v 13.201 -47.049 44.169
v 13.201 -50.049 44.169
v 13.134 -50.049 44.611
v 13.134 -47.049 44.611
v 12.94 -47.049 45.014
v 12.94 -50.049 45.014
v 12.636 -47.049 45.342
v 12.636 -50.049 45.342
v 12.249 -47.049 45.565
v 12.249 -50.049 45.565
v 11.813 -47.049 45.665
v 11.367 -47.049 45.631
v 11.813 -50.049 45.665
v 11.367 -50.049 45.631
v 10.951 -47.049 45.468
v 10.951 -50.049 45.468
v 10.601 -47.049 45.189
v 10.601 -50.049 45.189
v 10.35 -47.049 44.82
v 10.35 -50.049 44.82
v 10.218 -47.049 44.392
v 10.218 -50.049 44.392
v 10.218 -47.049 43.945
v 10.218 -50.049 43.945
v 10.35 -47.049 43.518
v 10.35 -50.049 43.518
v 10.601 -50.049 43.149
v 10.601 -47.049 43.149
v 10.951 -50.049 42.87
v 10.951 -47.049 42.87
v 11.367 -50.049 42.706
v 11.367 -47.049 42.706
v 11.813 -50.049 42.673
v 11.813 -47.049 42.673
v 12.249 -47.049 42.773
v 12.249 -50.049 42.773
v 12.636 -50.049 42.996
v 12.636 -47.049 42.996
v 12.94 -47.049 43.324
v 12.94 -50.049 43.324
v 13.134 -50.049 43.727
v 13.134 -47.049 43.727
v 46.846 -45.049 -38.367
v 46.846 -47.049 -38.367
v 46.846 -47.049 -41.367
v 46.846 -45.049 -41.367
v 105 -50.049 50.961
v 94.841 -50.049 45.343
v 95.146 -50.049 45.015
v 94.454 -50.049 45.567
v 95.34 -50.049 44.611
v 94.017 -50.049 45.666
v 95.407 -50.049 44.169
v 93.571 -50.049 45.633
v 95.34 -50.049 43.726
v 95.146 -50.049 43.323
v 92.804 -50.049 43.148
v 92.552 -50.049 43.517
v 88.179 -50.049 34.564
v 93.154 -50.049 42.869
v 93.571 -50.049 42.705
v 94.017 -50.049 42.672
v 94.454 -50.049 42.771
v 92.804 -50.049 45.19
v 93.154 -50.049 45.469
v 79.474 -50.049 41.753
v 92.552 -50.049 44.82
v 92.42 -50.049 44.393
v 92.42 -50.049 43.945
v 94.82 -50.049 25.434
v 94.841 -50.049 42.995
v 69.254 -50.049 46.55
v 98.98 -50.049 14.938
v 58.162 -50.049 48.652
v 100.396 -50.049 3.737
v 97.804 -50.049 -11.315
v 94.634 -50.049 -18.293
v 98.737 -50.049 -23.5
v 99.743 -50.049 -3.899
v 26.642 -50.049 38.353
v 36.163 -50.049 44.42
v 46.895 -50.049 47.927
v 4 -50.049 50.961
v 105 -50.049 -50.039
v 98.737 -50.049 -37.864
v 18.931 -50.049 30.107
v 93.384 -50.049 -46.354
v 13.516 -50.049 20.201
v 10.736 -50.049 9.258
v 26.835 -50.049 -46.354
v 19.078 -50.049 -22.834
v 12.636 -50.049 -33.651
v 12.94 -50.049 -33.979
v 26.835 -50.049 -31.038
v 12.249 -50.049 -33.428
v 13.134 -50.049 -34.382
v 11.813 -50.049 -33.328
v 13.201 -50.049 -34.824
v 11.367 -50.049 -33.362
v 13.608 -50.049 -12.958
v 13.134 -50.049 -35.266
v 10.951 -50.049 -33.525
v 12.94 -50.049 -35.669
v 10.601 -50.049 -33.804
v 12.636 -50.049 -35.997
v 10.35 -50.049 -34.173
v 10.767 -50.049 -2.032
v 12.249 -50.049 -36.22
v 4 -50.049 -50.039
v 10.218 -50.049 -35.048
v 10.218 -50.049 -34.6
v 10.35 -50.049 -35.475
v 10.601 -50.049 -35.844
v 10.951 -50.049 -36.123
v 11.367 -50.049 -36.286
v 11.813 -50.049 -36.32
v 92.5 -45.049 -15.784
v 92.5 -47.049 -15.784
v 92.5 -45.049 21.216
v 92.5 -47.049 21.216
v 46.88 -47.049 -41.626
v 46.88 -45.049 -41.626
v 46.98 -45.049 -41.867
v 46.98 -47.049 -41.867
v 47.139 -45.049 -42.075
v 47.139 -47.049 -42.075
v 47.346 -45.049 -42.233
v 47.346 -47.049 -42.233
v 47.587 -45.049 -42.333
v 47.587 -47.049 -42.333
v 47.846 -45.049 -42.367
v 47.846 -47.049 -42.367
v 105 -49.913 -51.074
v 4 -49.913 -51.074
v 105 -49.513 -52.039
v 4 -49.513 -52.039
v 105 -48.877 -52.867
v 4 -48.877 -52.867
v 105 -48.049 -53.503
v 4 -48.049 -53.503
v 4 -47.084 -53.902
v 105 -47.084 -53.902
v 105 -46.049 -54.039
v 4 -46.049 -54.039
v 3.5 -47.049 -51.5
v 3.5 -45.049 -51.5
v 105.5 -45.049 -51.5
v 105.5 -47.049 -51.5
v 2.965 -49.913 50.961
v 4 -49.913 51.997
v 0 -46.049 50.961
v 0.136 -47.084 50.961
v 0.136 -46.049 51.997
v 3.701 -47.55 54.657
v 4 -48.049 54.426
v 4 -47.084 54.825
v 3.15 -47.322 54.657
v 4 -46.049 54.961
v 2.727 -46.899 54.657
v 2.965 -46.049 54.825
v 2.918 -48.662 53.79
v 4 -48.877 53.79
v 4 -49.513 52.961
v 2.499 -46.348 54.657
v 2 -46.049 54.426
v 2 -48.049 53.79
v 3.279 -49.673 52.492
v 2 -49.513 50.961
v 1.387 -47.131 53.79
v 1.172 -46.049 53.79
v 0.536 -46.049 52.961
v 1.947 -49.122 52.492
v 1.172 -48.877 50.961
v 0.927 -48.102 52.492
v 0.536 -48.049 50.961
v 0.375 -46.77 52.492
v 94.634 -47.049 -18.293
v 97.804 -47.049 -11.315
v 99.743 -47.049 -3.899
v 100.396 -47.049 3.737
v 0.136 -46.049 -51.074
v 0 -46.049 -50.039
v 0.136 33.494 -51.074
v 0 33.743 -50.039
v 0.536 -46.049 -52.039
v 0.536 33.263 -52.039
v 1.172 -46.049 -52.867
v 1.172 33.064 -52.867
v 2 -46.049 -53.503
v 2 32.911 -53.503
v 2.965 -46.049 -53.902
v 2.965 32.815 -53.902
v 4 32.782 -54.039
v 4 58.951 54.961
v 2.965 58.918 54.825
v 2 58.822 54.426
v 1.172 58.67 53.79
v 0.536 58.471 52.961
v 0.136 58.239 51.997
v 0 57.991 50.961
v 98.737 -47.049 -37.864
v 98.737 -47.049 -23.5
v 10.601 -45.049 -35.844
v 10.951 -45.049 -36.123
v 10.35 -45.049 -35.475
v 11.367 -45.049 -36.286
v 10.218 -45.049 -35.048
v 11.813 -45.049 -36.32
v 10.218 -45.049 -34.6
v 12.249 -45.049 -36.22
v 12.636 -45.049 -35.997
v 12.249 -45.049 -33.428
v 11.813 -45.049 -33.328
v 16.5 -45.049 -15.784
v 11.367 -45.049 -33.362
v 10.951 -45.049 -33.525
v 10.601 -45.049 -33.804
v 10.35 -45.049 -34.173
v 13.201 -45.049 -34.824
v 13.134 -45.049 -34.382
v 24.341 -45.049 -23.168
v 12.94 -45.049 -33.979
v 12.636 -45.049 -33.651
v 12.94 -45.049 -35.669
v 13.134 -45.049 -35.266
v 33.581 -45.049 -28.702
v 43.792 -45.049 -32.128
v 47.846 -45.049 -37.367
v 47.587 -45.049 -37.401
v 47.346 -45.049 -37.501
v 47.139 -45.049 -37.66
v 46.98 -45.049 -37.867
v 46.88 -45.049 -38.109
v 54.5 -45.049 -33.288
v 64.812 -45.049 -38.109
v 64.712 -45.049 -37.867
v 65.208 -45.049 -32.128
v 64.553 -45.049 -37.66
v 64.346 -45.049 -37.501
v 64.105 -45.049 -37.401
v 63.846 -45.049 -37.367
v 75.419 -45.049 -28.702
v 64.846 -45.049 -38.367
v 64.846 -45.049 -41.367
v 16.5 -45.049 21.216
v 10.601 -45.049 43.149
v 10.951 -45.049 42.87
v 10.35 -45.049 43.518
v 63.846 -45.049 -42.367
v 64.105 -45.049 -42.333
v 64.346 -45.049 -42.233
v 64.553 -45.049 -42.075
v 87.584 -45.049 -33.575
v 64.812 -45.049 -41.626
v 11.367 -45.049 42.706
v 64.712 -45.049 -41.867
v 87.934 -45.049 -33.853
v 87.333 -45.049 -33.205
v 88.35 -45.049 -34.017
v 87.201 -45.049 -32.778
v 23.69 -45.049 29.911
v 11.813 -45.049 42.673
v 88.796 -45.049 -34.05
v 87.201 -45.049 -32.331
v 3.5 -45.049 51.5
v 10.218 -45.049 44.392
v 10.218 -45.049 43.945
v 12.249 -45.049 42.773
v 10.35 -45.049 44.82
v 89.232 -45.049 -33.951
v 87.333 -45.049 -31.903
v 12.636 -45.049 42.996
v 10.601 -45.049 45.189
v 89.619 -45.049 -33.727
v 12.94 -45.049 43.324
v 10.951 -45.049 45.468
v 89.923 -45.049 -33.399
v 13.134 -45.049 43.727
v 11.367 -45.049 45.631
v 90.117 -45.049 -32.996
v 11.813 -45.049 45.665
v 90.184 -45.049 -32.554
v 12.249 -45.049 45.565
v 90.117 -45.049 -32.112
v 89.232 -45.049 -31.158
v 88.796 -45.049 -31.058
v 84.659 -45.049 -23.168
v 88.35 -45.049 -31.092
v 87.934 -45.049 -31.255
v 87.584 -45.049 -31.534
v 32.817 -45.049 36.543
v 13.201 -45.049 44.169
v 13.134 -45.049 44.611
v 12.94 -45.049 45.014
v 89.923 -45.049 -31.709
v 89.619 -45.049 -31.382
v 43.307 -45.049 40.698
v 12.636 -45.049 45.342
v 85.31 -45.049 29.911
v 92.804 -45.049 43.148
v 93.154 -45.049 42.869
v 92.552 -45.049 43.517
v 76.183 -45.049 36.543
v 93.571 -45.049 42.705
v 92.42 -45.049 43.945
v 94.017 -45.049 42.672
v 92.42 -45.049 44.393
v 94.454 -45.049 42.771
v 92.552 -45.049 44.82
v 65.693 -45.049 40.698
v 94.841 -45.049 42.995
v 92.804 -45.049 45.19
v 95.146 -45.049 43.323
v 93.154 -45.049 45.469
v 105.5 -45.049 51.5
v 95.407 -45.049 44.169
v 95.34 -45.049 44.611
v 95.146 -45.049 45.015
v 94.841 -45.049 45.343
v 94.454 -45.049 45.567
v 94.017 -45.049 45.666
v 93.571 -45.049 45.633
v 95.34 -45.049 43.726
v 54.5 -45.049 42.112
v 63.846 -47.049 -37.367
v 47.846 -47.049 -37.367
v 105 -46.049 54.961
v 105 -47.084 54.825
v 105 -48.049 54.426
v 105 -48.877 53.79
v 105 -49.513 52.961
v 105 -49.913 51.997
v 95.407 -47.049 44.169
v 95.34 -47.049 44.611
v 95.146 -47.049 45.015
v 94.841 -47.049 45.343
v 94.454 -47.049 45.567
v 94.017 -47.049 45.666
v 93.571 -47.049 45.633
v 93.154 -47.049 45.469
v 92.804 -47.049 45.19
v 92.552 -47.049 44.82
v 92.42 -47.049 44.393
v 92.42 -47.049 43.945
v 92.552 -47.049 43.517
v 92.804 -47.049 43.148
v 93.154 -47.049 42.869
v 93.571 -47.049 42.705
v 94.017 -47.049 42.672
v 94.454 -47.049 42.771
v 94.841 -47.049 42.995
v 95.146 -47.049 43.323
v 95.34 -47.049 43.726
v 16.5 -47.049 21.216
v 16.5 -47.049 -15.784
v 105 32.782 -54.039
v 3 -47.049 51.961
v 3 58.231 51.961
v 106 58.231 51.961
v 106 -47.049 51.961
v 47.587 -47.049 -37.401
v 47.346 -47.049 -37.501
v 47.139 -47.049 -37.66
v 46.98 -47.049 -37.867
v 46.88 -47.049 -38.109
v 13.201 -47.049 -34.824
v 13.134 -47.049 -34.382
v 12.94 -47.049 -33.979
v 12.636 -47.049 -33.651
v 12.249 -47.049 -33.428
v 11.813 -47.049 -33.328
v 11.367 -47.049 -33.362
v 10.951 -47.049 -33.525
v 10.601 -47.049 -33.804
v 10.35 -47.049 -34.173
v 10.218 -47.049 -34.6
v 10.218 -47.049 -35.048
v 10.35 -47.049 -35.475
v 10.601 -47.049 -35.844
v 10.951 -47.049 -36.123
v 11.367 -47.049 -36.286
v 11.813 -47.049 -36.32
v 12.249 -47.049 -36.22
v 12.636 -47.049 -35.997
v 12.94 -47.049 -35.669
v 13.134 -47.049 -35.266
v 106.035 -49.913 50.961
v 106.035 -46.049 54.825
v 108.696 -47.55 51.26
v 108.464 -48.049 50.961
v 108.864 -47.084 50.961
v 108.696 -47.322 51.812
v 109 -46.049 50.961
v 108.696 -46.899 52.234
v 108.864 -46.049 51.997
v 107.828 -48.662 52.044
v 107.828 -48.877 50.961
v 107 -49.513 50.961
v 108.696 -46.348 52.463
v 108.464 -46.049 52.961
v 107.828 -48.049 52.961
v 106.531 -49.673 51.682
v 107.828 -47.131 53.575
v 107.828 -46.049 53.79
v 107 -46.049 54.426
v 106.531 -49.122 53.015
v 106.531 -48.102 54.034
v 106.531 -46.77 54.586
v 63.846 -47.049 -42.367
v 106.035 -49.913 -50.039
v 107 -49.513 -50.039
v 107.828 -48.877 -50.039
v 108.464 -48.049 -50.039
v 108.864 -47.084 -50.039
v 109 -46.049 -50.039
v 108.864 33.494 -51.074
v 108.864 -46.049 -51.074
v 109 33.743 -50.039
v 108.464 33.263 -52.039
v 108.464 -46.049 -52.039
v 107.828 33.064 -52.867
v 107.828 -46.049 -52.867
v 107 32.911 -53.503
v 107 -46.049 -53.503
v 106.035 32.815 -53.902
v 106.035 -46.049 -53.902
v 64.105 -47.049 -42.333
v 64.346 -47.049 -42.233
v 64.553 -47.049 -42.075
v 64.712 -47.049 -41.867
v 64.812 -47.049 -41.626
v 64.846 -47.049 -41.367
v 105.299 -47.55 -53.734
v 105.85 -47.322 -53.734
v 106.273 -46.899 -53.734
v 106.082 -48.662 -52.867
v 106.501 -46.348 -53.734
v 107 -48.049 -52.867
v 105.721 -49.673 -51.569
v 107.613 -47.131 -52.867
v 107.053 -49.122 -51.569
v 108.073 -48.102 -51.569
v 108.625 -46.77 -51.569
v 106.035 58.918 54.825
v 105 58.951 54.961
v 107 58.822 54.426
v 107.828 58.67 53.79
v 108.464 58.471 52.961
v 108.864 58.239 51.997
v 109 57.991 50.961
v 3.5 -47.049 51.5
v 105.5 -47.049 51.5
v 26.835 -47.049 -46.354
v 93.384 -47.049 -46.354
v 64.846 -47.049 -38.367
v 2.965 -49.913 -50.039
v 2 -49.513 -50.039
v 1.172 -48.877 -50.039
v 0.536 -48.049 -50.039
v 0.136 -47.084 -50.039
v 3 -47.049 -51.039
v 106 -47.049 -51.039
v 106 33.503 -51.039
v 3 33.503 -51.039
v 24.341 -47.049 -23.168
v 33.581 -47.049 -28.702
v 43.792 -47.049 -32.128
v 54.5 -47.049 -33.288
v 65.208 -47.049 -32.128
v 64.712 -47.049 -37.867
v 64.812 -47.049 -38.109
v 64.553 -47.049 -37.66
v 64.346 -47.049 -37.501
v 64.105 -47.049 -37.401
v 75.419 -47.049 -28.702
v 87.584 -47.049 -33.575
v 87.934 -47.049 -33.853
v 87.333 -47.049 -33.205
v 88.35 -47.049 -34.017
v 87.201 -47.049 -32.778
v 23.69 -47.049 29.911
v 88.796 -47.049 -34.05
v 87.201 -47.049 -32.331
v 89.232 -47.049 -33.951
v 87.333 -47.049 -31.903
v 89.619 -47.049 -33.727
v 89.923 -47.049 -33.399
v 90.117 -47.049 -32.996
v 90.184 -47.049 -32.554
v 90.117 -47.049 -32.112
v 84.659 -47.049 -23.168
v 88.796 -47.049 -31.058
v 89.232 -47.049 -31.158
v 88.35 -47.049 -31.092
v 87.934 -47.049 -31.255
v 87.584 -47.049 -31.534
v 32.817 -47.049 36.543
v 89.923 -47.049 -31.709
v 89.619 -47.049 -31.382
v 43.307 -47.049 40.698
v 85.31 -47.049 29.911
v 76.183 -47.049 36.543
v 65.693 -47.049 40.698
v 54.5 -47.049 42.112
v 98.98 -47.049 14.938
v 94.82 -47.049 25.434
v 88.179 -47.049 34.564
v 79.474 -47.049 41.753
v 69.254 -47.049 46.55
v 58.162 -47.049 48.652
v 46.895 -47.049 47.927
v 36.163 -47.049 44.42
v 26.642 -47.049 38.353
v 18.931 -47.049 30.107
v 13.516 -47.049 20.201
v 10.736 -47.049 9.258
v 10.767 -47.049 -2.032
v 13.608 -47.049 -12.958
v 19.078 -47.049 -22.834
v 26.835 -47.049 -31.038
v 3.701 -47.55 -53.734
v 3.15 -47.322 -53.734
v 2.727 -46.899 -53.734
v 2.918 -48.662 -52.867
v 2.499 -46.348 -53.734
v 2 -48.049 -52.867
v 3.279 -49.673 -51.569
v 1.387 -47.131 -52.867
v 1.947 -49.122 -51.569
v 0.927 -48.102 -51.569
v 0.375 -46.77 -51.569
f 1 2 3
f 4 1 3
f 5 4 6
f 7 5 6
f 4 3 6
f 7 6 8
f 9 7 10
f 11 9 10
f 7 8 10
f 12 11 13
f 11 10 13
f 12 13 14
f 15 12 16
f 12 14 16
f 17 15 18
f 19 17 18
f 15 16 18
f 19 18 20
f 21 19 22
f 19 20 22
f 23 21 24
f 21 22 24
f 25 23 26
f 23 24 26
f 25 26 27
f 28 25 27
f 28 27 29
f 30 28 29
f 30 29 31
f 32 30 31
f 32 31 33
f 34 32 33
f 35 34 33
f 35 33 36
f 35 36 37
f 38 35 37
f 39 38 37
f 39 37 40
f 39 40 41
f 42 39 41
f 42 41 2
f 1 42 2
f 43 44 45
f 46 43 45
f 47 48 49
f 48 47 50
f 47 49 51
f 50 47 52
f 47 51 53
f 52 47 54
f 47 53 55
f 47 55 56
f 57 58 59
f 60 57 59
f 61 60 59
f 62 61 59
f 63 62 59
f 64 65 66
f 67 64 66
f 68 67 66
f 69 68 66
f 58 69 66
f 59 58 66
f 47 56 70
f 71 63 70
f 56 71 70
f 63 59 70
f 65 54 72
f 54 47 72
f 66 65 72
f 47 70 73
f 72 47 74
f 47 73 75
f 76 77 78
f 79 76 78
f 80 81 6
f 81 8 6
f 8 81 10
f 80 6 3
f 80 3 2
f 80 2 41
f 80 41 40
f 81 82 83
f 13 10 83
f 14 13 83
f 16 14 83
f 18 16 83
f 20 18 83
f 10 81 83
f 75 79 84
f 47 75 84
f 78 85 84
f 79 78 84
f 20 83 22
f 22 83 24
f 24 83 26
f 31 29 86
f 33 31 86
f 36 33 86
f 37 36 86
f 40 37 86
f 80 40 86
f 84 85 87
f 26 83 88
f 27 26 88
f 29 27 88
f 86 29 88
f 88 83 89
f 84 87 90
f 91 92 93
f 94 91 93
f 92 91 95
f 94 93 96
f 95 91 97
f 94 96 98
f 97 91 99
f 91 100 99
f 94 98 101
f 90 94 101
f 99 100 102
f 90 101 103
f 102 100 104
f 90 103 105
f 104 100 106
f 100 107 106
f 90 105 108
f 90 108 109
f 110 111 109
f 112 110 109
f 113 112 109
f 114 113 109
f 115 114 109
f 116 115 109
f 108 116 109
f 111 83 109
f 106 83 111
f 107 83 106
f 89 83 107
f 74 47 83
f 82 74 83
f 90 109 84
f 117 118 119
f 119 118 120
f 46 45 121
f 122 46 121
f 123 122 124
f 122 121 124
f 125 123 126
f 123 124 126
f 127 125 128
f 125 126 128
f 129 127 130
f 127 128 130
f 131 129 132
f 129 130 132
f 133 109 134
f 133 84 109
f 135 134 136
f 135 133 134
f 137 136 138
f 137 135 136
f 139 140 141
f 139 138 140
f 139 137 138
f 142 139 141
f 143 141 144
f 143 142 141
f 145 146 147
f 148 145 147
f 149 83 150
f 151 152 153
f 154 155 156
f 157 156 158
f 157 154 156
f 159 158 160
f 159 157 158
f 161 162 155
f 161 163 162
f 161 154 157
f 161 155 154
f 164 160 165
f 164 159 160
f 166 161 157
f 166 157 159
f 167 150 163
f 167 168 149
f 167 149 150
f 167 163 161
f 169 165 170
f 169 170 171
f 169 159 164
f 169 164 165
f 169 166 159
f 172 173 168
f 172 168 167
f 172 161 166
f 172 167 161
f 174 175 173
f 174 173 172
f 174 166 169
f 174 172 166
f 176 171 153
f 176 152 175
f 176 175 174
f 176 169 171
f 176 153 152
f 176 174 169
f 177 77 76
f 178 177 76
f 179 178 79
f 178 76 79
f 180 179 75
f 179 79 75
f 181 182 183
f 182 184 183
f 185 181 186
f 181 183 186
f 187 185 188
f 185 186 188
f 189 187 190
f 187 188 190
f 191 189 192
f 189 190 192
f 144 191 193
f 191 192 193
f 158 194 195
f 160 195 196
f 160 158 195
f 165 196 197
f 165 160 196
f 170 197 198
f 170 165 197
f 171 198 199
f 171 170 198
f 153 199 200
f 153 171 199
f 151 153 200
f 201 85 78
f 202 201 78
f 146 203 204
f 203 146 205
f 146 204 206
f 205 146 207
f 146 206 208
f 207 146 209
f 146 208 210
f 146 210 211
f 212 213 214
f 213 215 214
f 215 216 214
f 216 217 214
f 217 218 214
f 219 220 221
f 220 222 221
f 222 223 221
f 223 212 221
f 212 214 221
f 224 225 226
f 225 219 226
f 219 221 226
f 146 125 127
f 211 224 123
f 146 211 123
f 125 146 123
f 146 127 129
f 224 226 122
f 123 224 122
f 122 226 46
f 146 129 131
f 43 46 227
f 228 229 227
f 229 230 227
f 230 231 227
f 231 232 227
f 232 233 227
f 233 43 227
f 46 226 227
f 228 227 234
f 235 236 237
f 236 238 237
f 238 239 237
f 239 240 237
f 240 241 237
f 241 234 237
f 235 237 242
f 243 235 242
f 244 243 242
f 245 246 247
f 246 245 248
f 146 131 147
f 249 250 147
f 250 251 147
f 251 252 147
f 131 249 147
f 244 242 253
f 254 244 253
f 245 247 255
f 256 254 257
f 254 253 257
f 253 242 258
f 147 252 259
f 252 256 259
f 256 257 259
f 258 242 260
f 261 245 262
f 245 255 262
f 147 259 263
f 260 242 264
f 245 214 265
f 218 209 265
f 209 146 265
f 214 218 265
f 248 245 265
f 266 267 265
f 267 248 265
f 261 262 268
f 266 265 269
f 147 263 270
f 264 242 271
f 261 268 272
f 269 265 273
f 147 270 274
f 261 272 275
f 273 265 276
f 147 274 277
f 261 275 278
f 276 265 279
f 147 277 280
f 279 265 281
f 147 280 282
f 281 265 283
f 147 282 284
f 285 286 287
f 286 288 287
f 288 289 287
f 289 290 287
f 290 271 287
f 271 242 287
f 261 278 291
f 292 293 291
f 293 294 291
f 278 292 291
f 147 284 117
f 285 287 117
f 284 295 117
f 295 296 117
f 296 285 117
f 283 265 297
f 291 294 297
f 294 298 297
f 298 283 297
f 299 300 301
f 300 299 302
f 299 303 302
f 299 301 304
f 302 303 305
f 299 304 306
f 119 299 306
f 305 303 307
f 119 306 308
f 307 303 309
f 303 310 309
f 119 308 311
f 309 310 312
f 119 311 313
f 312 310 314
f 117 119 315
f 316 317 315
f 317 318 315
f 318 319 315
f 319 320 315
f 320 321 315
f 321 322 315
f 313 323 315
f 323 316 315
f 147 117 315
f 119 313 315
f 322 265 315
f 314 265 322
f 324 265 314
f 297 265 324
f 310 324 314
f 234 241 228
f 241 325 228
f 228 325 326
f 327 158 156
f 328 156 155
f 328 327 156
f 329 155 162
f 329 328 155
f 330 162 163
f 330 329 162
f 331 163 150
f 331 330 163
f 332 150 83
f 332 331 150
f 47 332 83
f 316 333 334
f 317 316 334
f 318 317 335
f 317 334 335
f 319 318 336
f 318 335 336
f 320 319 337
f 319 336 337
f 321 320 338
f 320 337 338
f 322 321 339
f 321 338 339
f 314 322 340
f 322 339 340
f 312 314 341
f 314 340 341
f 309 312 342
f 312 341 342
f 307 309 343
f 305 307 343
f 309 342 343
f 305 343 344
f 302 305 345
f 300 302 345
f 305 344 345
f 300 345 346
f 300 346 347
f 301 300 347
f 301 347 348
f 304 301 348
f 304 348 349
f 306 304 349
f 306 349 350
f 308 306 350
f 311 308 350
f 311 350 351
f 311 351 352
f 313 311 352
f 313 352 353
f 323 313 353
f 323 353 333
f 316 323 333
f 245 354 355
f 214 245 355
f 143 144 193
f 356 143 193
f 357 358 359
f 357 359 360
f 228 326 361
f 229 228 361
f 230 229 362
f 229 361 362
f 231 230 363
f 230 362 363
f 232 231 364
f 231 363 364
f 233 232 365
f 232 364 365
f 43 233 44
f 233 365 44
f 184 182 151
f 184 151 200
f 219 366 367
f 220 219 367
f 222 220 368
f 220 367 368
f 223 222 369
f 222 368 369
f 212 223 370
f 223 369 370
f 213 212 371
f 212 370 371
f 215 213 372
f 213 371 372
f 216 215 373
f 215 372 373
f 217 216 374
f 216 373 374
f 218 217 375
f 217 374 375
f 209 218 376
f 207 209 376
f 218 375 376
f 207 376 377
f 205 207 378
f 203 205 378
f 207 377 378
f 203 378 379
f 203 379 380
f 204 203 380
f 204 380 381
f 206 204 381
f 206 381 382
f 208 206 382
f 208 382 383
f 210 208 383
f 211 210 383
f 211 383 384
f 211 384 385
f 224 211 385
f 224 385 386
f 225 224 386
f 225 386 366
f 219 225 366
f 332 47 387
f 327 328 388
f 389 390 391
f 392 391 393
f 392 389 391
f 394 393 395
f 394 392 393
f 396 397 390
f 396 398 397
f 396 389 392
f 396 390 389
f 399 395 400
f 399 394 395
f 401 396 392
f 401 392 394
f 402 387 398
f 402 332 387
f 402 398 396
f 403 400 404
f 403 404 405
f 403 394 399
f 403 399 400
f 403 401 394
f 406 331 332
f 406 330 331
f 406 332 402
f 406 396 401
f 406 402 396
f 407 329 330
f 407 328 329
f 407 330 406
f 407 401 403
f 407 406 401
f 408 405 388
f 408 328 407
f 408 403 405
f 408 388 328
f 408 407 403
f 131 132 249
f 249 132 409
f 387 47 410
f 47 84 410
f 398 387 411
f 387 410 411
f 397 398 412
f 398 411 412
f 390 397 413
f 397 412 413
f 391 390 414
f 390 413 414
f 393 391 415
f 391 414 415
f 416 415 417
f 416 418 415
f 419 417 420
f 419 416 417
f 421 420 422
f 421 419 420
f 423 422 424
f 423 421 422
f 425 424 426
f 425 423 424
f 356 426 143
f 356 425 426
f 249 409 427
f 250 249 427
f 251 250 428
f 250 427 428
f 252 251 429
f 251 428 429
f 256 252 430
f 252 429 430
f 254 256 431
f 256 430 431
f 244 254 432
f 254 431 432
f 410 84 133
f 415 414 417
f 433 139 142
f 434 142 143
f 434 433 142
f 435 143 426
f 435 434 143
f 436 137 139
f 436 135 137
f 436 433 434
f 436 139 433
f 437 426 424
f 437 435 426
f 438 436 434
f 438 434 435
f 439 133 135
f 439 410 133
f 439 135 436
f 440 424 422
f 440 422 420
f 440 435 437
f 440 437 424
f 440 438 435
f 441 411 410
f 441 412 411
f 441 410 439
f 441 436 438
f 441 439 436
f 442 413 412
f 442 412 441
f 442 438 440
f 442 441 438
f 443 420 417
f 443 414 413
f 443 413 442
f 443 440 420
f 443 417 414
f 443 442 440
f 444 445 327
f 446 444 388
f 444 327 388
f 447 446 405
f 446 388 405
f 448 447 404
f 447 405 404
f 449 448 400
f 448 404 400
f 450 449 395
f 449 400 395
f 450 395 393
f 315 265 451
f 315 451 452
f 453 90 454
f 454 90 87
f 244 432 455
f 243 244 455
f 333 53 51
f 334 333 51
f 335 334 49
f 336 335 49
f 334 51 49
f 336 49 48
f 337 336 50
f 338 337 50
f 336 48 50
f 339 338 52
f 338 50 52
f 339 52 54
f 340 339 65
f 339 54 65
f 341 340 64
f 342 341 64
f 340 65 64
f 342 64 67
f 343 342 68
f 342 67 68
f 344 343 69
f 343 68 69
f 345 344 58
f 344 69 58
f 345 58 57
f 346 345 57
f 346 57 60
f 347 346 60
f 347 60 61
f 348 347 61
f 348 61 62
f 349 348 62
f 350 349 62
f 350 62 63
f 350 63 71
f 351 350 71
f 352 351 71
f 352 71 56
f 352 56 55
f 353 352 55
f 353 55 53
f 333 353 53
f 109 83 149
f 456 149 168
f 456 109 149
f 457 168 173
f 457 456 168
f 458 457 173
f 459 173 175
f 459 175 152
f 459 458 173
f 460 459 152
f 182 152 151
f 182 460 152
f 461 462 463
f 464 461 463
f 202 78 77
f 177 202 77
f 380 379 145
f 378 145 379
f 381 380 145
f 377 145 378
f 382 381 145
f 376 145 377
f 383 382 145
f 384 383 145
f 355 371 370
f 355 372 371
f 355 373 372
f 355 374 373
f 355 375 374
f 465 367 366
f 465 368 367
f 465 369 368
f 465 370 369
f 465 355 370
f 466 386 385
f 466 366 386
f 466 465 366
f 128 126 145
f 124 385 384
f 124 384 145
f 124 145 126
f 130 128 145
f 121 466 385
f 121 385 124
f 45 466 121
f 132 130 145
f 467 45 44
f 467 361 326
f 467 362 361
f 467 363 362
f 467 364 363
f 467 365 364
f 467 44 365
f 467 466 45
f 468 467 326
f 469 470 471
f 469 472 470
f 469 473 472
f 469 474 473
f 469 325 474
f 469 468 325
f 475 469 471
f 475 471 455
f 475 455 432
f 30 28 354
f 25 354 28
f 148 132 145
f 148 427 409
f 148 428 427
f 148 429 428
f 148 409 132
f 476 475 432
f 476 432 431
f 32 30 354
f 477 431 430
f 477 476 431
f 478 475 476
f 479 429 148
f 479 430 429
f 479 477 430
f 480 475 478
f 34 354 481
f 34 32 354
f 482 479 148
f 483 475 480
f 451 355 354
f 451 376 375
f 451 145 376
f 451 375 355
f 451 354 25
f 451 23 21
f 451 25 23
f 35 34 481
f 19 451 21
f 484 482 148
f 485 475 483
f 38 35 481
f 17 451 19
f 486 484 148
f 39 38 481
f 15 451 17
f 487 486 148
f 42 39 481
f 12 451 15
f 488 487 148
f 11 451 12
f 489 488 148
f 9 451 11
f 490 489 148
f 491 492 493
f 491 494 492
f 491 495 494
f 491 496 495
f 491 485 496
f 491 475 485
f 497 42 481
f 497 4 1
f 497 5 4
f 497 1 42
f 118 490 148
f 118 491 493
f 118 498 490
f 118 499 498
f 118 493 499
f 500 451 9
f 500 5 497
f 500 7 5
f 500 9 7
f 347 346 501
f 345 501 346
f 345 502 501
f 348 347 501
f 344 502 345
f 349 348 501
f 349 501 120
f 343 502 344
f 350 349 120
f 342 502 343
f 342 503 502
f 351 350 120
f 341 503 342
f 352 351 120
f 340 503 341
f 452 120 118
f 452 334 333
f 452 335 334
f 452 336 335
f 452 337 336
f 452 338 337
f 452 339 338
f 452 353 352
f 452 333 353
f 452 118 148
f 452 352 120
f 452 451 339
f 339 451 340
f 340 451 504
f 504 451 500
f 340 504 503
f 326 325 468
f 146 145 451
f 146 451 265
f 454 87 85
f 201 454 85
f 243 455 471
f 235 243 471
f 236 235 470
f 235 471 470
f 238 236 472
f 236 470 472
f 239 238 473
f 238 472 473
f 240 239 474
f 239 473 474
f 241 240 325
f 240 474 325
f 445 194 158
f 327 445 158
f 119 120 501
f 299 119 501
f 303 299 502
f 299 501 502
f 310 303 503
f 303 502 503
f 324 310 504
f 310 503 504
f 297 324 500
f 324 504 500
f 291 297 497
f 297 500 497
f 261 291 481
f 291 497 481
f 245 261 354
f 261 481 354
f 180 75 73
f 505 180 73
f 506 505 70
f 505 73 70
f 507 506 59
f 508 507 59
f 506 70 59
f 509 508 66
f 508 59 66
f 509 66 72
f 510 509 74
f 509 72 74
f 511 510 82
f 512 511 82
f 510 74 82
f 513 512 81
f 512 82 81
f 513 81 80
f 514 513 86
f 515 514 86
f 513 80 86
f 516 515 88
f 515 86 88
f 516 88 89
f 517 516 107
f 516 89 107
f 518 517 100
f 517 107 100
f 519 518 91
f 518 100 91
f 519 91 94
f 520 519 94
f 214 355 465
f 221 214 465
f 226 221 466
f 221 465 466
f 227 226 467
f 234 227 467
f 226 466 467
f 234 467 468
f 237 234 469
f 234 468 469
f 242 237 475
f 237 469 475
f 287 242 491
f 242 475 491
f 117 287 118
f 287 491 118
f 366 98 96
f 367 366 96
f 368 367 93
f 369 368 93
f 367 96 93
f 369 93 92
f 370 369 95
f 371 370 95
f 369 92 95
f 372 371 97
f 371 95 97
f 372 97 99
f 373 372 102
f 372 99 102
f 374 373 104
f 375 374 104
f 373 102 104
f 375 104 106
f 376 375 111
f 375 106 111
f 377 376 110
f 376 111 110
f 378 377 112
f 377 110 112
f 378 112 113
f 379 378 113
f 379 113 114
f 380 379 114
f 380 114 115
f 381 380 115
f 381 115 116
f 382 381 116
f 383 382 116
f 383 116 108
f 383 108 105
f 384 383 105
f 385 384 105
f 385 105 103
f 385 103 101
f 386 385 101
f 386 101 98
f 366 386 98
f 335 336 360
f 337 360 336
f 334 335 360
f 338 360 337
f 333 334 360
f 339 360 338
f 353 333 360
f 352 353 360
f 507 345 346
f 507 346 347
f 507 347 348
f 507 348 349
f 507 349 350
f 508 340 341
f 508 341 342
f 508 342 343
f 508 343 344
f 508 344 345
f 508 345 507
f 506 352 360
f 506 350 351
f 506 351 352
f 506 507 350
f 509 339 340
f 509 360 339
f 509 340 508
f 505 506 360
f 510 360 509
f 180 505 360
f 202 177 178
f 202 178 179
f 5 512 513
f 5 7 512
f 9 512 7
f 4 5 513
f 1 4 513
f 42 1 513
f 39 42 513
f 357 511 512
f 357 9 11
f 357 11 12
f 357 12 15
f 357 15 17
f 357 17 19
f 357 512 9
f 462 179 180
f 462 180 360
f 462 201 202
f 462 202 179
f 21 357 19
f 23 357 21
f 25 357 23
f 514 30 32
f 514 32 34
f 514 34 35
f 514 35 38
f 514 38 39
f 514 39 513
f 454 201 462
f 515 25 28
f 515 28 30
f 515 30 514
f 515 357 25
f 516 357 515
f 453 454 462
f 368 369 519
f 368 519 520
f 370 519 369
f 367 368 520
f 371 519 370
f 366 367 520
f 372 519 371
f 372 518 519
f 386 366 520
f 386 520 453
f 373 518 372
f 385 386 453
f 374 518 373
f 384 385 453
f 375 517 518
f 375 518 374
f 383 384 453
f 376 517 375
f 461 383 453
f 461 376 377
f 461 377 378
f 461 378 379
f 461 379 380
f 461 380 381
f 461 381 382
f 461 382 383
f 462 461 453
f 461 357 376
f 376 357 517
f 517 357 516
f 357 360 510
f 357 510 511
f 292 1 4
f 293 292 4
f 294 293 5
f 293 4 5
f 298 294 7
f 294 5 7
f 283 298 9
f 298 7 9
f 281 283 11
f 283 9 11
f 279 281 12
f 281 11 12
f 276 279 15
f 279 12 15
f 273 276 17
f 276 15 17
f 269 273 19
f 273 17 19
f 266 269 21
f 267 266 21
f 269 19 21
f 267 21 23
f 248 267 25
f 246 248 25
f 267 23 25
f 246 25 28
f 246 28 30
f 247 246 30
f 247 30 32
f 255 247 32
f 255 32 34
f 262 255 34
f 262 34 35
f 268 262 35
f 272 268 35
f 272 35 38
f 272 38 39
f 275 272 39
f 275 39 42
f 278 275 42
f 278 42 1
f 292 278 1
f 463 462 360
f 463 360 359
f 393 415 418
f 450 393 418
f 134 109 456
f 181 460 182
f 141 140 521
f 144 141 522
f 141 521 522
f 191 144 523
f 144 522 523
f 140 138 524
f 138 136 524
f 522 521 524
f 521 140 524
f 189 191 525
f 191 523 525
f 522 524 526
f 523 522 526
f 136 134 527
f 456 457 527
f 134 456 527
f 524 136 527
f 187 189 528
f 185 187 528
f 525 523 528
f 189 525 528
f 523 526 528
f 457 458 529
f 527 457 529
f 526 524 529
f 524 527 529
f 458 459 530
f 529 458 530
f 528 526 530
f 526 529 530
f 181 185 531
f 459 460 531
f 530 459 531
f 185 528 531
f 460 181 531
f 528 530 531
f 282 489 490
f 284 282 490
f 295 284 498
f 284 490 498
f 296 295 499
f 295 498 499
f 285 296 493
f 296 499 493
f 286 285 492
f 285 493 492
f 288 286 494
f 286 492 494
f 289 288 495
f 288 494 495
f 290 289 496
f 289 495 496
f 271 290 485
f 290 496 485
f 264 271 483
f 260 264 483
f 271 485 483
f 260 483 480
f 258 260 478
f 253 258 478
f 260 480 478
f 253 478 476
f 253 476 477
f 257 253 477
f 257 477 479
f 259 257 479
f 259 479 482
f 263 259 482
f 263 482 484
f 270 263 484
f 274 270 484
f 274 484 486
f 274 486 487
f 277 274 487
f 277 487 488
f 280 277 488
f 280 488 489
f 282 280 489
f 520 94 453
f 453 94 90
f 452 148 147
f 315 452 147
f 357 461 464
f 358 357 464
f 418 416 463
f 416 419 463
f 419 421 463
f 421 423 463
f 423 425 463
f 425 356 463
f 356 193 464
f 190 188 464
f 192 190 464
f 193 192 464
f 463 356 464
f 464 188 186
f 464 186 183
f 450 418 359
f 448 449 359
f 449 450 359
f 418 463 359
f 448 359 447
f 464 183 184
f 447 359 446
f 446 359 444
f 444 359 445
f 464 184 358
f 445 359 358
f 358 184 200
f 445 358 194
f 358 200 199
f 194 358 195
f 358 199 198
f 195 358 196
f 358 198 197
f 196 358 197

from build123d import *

# Parameters (mm, degrees)
F1_DEPTH      = 109
F2_T          = -3
F4_DEPTH      = 25
F5_W          = 102
F5_H          = 2
F6_DEPTH      = 51.5
F6_DEPTH_BACK = 51.5
F7_R          = 1.5
F7_R_2        = 1.501475
F8_DEPTH      = 25
F9_R          = 4


with BuildPart() as f1:
    # F0 (on Right) → F1 (new body)
    with BuildSketch(Plane.YZ):
        Polygon((32.782498, -54.038571), (58.951083, 54.961429), (-50.048917, 54.961429), (-50.048917, -54.038571), align=None)
    extrude(amount=F1_DEPTH)

    # F2
    f2_openings = [f1.faces().sort_by_distance(p)[0] for p in [
        (54.5, 45.86679, 0.461429),
    ]]
    offset(amount=F2_T, openings=f2_openings)

    # F3 (on face) → F4 (cut)
    with BuildSketch(Plane.XZ.offset(50.048917)):
        with BuildLine():
            ThreePointArc((94.634399, -18.293005), (98.931641, -7.648317), (100.395816, 3.737283))
            ThreePointArc((100.395816, 3.737283), (36.163407, 44.420381), (26.835173, -31.03756))
            ThreePointArc((26.835173, -31.03756), (63.70909, -40.488156), (94.634399, -18.293005))
        make_face()
        with BuildLine():
            ThreePointArc((94.634399, -18.293005), (63.70909, -40.488156), (26.835173, -31.03756))
            Line((26.835173, -31.03756), (26.835173, -46.354149))
            Line((26.835173, -46.354149), (93.383867, -46.354149))
            Line((93.383867, -46.354149), (98.736793, -37.863731))
            Line((98.736793, -37.863731), (98.736793, -23.499892))
            Line((98.736793, -23.499892), (94.634399, -18.293005))
        make_face()
    extrude(amount=-F4_DEPTH, mode=Mode.SUBTRACT)


with BuildPart() as f6:
    # F5 (on Top) → F6 (new body, two sides)
    with BuildSketch(Plane.XY) as f6_sk:
        with Locations((54.5, -46.048917)):
            Rectangle(F5_W, F5_H)
    extrude(amount=F6_DEPTH)
    extrude(f6_sk.sketch, amount=-F6_DEPTH_BACK)


with BuildPart() as f8_tool:
    # F7 (on face) → F8 (new body)
    with BuildSketch(Plane.XZ.offset(50.048917)):
        with BuildLine():
            ThreePointArc((92.5, 21.215899), (54.5, 42.111957), (16.5, 21.215899))
            Line((16.5, 21.215899), (16.5, -15.784101))
            ThreePointArc((16.5, -15.784101), (54.5, -33.287947), (92.5, -15.784101))
            Line((92.5, -15.784101), (92.5, 21.215899))
        make_face()
        with BuildLine():
            Line((63.846135, -37.367422), (47.846135, -37.367422))
            ThreePointArc((47.846135, -37.367422), (47.139028, -37.660315), (46.846135, -38.367422))
            Line((46.846135, -38.367422), (46.846135, -41.367422))
            ThreePointArc((46.846135, -41.367422), (47.139028, -42.074529), (47.846135, -42.367422))
            Line((47.846135, -42.367422), (63.846135, -42.367422))
            ThreePointArc((63.846135, -42.367422), (64.553242, -42.074529), (64.846135, -41.367422))
            Line((64.846135, -41.367422), (64.846135, -38.367422))
            ThreePointArc((64.846135, -38.367422), (64.553242, -37.660315), (63.846135, -37.367422))
        make_face()
        with Locations((88.684045, -32.554273)):
            Circle(F7_R)
        with Locations((11.701023, 44.168854)):
            Circle(F7_R)
        with Locations((11.701023, -34.824036)):
            Circle(F7_R)
        with Locations((93.905059, 44.168854)):
            Circle(F7_R_2)
    extrude(amount=-F8_DEPTH)


with BuildPart() as f1_1:
    add(f1.part)

    # F8: cut by f8_tool
    add(f8_tool.part, mode=Mode.SUBTRACT)

    # F9
    f9_edges = [f1_1.edges().sort_by_distance(p)[0] for p in [
        (0, -50.048917, 0.461429),
        (54.5, -50.048917, 54.961429),
        (109, -50.048917, 0.461429),
        (54.5, -50.048917, -54.038571),
        (0, 4.451083, 54.961429),
        (0, -8.63321, -54.038571),
        (109, -8.63321, -54.038571),
        (109, 4.451083, 54.961429),
    ]]
    fillet(f9_edges, radius=F9_R)


with BuildPart() as f6_1:
    add(f6.part)

    # F8: cut by f8_tool
    add(f8_tool.part, mode=Mode.SUBTRACT)


solid = Compound([f1_1.part, f6_1.part])
